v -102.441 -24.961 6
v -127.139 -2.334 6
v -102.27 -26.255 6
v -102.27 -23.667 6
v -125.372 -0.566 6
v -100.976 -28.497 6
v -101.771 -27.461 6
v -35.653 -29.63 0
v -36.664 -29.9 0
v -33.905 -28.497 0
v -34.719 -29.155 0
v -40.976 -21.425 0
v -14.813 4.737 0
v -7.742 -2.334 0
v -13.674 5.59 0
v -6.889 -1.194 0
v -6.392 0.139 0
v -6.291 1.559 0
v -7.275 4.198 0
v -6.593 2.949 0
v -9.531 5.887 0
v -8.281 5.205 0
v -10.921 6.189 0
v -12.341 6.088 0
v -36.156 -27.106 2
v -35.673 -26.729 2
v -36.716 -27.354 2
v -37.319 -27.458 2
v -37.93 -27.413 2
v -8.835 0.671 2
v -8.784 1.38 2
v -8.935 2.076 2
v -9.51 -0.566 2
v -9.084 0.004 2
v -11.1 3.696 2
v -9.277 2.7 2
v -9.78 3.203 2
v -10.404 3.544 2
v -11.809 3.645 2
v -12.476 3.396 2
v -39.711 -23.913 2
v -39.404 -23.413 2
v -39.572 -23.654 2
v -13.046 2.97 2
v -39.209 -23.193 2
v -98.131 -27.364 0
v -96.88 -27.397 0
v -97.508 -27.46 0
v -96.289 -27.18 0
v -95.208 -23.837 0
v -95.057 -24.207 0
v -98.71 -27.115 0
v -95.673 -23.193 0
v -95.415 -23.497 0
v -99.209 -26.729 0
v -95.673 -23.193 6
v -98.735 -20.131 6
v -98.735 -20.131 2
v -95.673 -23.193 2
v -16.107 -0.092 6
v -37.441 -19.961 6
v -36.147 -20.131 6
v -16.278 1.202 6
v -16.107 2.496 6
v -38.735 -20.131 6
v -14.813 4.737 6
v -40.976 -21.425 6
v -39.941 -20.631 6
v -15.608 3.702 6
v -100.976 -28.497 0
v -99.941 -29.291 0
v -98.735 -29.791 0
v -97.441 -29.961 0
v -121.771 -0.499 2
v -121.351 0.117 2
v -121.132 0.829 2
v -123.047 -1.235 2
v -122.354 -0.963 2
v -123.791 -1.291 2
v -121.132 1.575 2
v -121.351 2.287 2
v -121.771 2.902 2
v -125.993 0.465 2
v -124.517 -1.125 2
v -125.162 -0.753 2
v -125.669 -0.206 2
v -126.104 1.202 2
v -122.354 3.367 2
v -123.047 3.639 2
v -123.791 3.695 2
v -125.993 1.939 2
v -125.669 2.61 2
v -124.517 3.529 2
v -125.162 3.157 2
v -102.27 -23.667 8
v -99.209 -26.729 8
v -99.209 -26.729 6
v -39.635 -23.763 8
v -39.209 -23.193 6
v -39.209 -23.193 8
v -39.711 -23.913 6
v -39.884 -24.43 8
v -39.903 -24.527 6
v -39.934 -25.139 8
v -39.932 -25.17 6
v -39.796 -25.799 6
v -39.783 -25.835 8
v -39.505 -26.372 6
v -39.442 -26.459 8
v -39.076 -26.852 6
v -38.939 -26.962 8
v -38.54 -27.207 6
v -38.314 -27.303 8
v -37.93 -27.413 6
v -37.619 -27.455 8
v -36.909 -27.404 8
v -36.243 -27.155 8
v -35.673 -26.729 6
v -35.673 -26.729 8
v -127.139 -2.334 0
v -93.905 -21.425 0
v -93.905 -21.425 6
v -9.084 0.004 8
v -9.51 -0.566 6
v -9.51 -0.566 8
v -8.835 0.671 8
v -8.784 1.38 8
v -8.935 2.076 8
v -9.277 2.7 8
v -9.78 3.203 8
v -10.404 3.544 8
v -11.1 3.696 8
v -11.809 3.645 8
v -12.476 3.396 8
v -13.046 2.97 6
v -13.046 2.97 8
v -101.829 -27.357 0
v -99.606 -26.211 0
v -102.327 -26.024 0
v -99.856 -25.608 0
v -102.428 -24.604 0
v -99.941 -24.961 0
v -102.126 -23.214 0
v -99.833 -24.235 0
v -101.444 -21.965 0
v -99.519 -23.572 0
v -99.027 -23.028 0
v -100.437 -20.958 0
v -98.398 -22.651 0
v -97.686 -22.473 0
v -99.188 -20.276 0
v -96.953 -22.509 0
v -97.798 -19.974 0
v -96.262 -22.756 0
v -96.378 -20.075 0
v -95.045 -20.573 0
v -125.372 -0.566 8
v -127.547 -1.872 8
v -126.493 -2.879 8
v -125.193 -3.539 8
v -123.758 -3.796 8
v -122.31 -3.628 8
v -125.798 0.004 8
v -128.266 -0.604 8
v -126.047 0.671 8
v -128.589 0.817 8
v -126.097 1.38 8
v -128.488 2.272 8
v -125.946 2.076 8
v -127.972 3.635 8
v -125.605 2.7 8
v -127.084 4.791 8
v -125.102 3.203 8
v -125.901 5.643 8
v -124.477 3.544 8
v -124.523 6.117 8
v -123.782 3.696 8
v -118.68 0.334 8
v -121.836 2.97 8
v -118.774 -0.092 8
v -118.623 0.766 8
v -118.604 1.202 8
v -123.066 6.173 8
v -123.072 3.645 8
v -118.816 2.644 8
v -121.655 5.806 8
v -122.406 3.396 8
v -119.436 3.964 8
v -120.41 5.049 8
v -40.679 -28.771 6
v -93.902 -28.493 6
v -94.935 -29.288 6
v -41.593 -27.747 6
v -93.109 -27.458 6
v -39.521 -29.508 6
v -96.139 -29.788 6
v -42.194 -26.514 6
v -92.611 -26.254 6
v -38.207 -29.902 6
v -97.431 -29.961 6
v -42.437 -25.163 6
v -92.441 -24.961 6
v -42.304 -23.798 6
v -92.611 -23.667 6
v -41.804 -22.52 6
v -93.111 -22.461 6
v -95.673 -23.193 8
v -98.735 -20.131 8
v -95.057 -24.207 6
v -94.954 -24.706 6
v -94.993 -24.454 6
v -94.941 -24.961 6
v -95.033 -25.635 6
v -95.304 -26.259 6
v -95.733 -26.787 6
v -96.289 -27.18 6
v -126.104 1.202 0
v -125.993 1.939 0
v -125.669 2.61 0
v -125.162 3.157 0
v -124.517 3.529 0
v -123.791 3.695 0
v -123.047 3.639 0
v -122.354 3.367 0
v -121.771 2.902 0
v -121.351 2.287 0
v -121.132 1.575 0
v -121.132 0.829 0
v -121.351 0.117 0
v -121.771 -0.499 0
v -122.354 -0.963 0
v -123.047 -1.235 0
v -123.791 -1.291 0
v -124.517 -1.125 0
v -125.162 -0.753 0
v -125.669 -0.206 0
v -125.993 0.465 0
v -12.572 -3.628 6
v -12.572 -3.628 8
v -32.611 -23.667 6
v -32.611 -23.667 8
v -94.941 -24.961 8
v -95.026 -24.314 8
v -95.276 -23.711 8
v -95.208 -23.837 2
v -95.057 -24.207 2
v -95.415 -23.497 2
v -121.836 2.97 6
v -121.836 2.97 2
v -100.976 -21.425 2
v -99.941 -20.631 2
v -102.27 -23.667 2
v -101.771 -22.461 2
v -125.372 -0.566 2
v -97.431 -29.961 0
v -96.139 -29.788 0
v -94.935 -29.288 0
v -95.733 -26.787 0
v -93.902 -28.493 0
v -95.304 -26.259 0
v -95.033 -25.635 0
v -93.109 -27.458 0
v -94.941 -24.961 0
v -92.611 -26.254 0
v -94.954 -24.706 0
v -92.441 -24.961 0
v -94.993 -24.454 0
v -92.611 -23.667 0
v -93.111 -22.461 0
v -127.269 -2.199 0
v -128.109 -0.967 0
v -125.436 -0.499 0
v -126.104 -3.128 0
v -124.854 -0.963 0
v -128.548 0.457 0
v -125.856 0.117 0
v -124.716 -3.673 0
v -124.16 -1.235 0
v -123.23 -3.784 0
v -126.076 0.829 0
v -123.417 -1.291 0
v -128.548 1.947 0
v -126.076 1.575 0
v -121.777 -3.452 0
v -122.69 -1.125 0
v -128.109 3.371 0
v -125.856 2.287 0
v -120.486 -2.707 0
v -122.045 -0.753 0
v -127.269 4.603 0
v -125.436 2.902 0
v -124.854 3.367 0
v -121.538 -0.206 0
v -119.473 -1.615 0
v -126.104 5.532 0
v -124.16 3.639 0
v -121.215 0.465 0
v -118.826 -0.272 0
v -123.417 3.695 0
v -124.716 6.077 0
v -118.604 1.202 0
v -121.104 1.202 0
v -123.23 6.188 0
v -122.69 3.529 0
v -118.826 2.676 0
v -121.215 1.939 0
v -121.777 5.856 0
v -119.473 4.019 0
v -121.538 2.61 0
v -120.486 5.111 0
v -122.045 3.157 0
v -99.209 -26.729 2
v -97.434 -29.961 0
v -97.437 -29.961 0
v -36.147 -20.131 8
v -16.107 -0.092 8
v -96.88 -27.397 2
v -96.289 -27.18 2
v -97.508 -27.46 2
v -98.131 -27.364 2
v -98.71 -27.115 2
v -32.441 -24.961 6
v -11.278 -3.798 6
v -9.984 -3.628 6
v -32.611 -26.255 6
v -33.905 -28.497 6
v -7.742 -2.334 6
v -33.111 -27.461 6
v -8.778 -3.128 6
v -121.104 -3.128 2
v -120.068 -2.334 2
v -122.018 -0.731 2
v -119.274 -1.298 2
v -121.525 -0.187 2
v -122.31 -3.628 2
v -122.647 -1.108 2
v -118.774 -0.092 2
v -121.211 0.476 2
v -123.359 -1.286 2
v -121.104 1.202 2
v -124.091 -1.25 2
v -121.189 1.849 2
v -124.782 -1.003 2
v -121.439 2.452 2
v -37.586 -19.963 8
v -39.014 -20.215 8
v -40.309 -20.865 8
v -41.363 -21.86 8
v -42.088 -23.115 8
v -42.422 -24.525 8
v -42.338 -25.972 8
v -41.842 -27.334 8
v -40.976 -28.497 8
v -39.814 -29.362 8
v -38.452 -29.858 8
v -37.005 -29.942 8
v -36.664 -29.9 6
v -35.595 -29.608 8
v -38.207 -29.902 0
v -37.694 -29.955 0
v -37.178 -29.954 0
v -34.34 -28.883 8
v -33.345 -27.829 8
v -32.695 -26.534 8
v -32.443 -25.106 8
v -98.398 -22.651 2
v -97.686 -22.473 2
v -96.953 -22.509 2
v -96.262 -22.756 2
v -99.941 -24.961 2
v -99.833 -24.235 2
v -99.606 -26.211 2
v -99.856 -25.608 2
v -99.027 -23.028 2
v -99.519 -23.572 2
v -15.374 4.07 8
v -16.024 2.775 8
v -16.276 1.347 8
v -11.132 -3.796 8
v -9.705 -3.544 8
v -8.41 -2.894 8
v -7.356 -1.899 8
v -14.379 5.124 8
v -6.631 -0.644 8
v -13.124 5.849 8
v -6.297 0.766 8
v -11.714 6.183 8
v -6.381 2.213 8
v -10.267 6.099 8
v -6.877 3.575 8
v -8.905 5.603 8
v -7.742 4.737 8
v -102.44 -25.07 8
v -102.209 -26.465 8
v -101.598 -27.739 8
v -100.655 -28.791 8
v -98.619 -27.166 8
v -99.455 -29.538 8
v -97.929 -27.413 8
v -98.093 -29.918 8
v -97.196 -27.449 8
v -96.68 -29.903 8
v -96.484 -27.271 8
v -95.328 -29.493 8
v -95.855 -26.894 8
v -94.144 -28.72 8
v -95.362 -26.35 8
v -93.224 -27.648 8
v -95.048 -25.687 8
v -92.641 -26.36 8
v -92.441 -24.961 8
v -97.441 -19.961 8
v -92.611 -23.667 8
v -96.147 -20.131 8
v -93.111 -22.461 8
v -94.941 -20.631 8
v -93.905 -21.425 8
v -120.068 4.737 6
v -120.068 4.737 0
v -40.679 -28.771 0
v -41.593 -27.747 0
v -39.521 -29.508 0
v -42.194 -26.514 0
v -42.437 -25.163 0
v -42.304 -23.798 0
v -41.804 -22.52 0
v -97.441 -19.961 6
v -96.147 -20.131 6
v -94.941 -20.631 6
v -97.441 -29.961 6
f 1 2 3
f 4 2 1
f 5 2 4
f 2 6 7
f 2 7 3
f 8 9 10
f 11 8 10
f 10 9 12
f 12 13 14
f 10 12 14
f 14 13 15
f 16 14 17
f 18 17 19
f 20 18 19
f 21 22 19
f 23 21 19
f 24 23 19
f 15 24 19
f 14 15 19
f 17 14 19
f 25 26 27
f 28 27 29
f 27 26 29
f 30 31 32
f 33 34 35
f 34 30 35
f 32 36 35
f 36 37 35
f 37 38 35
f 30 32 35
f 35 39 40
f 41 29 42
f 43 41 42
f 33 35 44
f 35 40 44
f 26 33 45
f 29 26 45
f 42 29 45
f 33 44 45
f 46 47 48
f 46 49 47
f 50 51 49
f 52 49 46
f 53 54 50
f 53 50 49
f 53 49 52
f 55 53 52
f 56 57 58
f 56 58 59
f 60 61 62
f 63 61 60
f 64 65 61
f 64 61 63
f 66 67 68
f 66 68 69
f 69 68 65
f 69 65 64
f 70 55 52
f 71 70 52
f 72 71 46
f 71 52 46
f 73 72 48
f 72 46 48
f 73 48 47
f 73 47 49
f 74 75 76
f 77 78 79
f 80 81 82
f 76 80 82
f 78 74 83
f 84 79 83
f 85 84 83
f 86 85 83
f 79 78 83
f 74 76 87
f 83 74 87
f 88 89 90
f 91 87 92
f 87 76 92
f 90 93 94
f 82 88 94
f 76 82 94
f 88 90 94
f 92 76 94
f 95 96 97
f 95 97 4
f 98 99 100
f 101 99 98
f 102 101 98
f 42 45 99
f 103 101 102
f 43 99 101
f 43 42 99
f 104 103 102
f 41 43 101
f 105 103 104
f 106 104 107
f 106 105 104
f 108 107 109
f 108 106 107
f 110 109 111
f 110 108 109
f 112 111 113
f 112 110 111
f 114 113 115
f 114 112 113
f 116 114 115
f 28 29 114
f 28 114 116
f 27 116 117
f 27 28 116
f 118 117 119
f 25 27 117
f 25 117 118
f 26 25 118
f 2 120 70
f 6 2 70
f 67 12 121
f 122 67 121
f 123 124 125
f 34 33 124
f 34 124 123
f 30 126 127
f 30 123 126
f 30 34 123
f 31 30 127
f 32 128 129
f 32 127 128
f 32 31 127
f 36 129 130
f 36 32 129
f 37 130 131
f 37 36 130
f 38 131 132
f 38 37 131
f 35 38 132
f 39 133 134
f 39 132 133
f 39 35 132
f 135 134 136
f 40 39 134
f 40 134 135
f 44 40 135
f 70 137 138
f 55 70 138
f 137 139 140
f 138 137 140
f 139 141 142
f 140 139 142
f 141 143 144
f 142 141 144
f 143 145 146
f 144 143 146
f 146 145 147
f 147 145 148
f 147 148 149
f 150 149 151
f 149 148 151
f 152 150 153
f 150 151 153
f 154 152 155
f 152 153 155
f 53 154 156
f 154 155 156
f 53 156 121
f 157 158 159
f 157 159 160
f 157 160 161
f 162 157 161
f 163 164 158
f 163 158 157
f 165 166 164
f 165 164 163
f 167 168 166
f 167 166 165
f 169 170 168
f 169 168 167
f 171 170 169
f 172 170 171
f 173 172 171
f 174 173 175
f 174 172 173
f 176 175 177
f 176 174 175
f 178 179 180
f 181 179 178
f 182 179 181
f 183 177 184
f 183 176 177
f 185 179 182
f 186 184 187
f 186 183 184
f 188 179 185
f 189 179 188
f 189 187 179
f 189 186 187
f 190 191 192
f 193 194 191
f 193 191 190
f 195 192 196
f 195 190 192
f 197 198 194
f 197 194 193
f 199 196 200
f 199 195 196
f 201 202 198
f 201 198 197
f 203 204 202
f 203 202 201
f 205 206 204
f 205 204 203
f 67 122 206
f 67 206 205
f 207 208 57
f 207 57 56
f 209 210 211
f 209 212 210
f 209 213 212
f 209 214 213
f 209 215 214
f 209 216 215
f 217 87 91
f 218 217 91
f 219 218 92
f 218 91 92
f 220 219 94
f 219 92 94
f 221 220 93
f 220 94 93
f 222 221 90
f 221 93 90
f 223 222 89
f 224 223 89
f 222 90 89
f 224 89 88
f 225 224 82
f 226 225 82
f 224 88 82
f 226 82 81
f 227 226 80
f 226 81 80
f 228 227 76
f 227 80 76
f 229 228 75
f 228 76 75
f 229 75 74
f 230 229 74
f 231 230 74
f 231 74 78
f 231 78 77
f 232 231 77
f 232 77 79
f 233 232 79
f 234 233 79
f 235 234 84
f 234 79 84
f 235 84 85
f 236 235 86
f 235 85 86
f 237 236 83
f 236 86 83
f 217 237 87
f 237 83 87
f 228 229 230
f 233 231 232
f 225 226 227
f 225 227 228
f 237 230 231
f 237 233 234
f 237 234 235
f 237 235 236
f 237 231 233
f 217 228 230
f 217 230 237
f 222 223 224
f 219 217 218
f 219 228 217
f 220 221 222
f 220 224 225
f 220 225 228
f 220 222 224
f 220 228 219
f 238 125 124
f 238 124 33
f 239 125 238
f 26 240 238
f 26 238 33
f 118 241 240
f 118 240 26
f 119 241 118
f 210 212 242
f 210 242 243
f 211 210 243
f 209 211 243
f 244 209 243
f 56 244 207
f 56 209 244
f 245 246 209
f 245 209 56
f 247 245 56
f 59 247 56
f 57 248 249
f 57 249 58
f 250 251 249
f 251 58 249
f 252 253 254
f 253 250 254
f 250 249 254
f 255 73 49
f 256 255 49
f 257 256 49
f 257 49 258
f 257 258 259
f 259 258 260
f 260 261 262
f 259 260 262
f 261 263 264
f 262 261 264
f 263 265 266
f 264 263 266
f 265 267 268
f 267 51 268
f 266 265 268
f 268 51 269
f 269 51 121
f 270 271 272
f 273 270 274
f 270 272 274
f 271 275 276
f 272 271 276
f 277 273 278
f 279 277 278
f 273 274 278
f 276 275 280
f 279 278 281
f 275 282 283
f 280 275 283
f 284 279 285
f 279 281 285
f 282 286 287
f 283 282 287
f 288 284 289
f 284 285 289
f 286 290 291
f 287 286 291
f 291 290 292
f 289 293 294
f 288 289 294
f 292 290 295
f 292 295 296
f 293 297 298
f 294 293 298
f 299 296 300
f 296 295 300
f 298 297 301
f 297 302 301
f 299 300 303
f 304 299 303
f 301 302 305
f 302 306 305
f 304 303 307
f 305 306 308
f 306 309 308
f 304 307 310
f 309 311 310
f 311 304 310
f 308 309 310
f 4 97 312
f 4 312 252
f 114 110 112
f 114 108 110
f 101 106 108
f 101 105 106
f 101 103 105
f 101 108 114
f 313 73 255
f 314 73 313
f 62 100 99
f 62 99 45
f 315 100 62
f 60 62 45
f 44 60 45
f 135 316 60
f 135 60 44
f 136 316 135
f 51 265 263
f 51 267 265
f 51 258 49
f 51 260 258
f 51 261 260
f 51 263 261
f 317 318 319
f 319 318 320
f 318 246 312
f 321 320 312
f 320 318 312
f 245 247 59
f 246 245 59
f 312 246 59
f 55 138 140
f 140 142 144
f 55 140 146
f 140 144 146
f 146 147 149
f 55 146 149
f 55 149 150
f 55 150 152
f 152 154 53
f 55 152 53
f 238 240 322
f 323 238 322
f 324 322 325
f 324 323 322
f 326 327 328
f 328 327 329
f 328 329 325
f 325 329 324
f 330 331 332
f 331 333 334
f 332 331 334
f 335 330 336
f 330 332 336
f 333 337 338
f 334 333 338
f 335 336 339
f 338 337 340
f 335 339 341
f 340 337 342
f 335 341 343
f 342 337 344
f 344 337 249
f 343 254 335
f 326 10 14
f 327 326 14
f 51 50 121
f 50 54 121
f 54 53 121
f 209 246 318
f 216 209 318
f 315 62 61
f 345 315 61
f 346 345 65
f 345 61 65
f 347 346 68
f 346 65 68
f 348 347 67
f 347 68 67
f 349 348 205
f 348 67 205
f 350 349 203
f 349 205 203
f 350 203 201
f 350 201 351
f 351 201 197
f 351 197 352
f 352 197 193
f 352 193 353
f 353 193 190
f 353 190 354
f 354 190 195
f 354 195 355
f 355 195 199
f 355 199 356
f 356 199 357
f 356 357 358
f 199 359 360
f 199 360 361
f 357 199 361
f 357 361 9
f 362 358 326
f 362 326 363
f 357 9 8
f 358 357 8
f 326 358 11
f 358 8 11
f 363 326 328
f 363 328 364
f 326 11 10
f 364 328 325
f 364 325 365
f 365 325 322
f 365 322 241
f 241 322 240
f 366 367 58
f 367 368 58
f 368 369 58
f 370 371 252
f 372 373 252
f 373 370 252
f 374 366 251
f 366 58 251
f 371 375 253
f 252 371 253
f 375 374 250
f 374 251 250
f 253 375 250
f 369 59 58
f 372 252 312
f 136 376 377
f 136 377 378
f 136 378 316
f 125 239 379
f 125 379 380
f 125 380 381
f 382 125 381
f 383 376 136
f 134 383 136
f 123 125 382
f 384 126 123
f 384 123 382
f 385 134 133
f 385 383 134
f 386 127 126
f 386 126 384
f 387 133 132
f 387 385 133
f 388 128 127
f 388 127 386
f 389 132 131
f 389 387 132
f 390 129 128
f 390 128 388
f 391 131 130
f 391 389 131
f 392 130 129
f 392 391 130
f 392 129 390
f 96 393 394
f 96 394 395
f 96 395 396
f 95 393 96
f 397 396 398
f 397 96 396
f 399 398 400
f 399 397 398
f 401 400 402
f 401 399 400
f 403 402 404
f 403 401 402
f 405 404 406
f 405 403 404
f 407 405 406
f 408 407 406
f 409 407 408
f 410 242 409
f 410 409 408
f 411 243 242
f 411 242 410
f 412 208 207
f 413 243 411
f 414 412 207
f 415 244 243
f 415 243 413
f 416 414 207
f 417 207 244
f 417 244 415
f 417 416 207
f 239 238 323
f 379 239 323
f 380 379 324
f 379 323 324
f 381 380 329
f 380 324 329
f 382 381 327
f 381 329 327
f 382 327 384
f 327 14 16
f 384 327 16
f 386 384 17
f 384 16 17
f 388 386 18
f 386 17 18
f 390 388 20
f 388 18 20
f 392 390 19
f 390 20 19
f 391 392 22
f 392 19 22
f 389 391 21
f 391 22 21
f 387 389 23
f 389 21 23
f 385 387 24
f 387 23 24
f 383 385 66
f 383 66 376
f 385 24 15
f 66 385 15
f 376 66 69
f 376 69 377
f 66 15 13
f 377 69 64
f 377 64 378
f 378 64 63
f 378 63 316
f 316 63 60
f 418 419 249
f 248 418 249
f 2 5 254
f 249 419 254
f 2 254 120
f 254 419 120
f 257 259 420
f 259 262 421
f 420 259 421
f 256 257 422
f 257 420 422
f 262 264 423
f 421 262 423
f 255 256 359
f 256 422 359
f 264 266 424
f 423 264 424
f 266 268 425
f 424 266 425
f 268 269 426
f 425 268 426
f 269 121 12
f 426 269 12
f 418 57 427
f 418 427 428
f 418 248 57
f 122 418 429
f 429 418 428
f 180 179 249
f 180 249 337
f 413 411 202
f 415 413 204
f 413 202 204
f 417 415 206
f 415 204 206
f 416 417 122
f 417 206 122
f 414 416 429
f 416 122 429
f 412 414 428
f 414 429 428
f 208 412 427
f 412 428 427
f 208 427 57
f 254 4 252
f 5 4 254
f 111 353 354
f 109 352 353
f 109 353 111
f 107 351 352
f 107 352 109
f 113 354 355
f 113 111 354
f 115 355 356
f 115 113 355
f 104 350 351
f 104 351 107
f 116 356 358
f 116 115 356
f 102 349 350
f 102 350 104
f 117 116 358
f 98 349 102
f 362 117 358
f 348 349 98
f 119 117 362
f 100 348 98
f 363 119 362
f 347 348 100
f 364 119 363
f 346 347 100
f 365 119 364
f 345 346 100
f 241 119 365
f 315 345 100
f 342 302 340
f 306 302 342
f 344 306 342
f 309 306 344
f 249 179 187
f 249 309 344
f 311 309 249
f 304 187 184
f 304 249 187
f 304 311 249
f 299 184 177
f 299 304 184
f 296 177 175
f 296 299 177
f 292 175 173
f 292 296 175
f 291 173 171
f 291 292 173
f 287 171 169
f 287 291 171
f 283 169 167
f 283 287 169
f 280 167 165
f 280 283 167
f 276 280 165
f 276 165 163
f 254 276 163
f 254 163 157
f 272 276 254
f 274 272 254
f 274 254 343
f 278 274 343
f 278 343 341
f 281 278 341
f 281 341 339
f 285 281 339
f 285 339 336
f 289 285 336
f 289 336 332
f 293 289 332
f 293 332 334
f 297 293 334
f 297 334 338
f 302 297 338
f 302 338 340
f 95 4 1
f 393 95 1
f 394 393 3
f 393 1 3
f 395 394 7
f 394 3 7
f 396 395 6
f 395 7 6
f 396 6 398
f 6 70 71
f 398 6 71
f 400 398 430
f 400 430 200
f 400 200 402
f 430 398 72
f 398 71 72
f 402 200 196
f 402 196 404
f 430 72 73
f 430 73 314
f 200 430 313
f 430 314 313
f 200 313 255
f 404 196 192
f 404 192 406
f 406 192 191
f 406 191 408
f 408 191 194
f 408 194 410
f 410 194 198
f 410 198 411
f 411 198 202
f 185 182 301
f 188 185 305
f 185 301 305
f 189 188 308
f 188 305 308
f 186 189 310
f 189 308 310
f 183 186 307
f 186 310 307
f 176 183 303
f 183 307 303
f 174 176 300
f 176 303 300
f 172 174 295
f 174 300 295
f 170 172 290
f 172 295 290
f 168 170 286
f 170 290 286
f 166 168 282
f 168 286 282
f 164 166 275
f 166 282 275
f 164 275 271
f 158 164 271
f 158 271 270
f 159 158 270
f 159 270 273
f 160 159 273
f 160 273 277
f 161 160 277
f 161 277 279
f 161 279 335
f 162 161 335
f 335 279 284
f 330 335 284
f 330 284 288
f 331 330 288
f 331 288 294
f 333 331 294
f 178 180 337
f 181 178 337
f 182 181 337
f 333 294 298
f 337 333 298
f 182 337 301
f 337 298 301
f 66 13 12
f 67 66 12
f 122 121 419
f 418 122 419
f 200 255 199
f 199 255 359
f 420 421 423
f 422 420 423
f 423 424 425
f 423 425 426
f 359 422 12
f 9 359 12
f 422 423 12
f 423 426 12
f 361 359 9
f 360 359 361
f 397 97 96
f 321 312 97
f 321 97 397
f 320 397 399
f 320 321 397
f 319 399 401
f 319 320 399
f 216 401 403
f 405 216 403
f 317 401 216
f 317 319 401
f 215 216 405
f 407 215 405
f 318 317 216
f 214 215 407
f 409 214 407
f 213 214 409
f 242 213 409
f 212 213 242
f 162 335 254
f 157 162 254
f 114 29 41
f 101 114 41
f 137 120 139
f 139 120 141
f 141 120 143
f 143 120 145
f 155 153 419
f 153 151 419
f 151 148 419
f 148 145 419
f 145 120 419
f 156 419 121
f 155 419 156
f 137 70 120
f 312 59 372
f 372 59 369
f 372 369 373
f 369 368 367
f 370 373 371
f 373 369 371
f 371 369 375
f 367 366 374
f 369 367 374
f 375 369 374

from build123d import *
from build123d.topology import SkipClean

# Parameters (mm, degrees)
SKETCH_1_R            = 5
SKETCH_1_R_2          = 2.5
EXTRUDE_1_DEPTH       = 10
EXTRUDE_1_2_DEPTH     = 10
EXTRUDE_1_3_DEPTH     = 10
EXTRUDE_1_4_DEPTH     = 10
EXTRUDE_2_DEPTH       = 6
CUT_EXTRUDE_1_DEPTH   = 4
EXTRUDE_START         = -2
EXTRUDE_3_OUTLINE_R   = 2.5
EXTRUDE_3_DEPTH       = 2
EXTRUDE_3_2_DEPTH     = 2
EXTRUDE_3_3_OUTLINE_R = 2.5
EXTRUDE_3_3_DEPTH     = 2
CUT_EXTRUDE_2_DEPTH   = 4
CUT_EXTRUDE_6_DEPTH   = 8
EXTRUDE_4_DEPTH       = 6
CUT_EXTRUDE_START     = -2
CUT_EXTRUDE_8_DEPTH   = 2
CUT_EXTRUDE_8_2_DEPTH = 2


with BuildPart() as part:
    # Эскиз1 → Бобышка-Вытянуть1 (new body)
    with BuildSketch(Plane.XY):
        with Locations((-11.277859903, 1.201925786)):
            Circle(SKETCH_1_R)
        with Locations((-11.277859903, 1.201925786)):
            Circle(SKETCH_1_R_2, mode=Mode.SUBTRACT)
    extrude(amount=EXTRUDE_1_DEPTH)



with BuildPart() as body_2:
    # Эскиз1 → Extrude 1 2 (new body)
    with BuildSketch(Plane.XY):
        with Locations((-37.440810807, -24.961025118)):
            Circle(SKETCH_1_R)
        with Locations((-37.440810807, -24.961025118)):
            Circle(SKETCH_1_R_2, mode=Mode.SUBTRACT)
    extrude(amount=EXTRUDE_1_2_DEPTH)


with BuildPart() as body_3:
    # Эскиз1 → Extrude 1 3 (new body)
    with BuildSketch(Plane.XY):
        with Locations((-97.440810807, -24.961025118)):
            Circle(SKETCH_1_R)
        with Locations((-97.440810807, -24.961025118)):
            Circle(SKETCH_1_R_2, mode=Mode.SUBTRACT)
    extrude(amount=EXTRUDE_1_3_DEPTH)


with BuildPart() as body_4:
    # Эскиз1 → Extrude 1 4 (new body)
    with BuildSketch(Plane.XY):
        with Locations((-123.603761711, 1.201925786)):
            Circle(SKETCH_1_R)
        with Locations((-123.603761711, 1.201925786)):
            Circle(SKETCH_1_R_2, mode=Mode.SUBTRACT)
    extrude(amount=EXTRUDE_1_4_DEPTH)


with BuildPart() as part_1:
    add(part.part)

    add(body_2.part)  # Бобышка-Вытянуть2 merges body 2
    # Эскиз3 → Бобышка-Вытянуть2 (add)
    with BuildSketch(Plane(origin=(0, 0, 0), x_dir=(-1, 0, 0), z_dir=(0, 0, -1))):
        Polygon((11.277859903, 1.201925786), (14.813393809, 4.737459692), (40.976344713, -21.425491212), (33.905276901, -28.496559024), (7.742325997, -2.33360812), align=None)
        Polygon((97.440810807, -24.961025118), (93.905276901, -21.425491212), (120.068227805, 4.737459692), (127.139295617, -2.33360812), (100.976344713, -28.496559024), align=None)
    extrude(amount=-EXTRUDE_2_DEPTH)

    # Эскиз4 → Вырез-Вытянуть1 (cut)
    with BuildSketch(Plane.XY.offset(6)):
        Polygon((-13.045626856, 2.969692739), (-9.51009295, -0.565841167), (-35.673043854, -26.728792071), (-39.20857776, -23.193258165), align=None)
    extrude(amount=-CUT_EXTRUDE_1_DEPTH, mode=Mode.SUBTRACT)

    # Extrude 3 2 outline → Extrude 3 2 (add)
    with BuildSketch(Plane(origin=(0, 0, 0), x_dir=(-1, 0, 0), z_dir=(0, 0, -1)).offset(EXTRUDE_START)):
        with BuildLine():
            Line((9.51009295, -0.565841167), (13.045626856, 2.969692739))
            ThreePointArc((13.045626856, 2.969692739), (9.51009295, 2.969692739), (9.51009295, -0.565841167))
        make_face()
        with BuildLine():
            Line((39.20857776, -23.193258165), (35.673043854, -26.728792071))
            ThreePointArc((35.673043854, -26.728792071), (39.20857776, -26.728792071), (39.20857776, -23.193258165))
        make_face()
    extrude(amount=EXTRUDE_3_2_DEPTH)

    # Эскиз4<2> → Вырез-Вытянуть2 (cut)
    with BuildSketch(Plane.XY.offset(6)):
        Polygon((-13.045626856, 2.969692739), (-9.51009295, -0.565841167), (-35.673043854, -26.728792071), (-39.20857776, -23.193258165), align=None)
    extrude(amount=CUT_EXTRUDE_2_DEPTH, mode=Mode.SUBTRACT)


with BuildPart() as body_4_2:
    # Бобышка-Вытянуть3: read off the stored shape, not the designer's step
    # Бобышка-Вытянуть3 outline → Бобышка-Вытянуть3 (new body)
    with BuildSketch(Plane(origin=(0, 0, 0), x_dir=(-1, 0, 0), z_dir=(0, 0, -1)).offset(EXTRUDE_START)):
        with Locations((123.603761711, 1.201925786)):
            Circle(EXTRUDE_3_OUTLINE_R)
    extrude(amount=EXTRUDE_3_DEPTH)


with BuildPart() as body_5:
    # Extrude 3 3 outline → Extrude 3 3 (new body)
    with BuildSketch(Plane(origin=(0, 0, 0), x_dir=(-1, 0, 0), z_dir=(0, 0, -1)).offset(EXTRUDE_START)):
        with Locations((97.440810807, -24.961025118)):
            Circle(EXTRUDE_3_3_OUTLINE_R)
    extrude(amount=EXTRUDE_3_3_DEPTH)


with BuildPart() as cut_extrude_6_tool:
    # Эскиз9 → Вырез-Вытянуть6 (new body)
    with BuildSketch(Plane.XY.offset(10)):
        Polygon((-123.603761711, 1.201925786), (-121.835994758, 2.969692739), (-95.673043854, -23.193258165), (-99.20857776, -26.728792071), (-125.371528664, -0.565841167), align=None)
    extrude(amount=-CUT_EXTRUDE_6_DEPTH)


with BuildPart() as part_2:
    add(part_1.part)

    # Вырез-Вытянуть6: cut by cut_extrude_6_tool
    add(cut_extrude_6_tool.part, mode=Mode.SUBTRACT)



with BuildPart() as body_3_1:
    add(body_3.part)

    # Вырез-Вытянуть6: cut by cut_extrude_6_tool
    add(cut_extrude_6_tool.part, mode=Mode.SUBTRACT)


with BuildPart() as body_4_1:
    add(body_4.part)

    # Вырез-Вытянуть6: cut by cut_extrude_6_tool
    add(cut_extrude_6_tool.part, mode=Mode.SUBTRACT)

    # Вырез-Вытянуть8: read off the stored shape, not the designer's step
    # Вырез-Вытянуть8 outline → Вырез-Вытянуть8 (cut)
    with BuildSketch(Plane.XY.offset(10).offset(CUT_EXTRUDE_START)):
        with BuildLine():
            ThreePointArc((-118.774132579, -0.092169439), (-127.139295617, 4.737459691), (-122.309666485, -3.627703345))
            Line((-122.309666485, -3.627703345), (-125.371528664, -0.565841167))
            ThreePointArc((-125.371528664, -0.565841167), (-125.371528664, 2.969692739), (-121.835994758, 2.969692739))
            Line((-121.835994758, 2.969692739), (-118.774132579, -0.092169439))
        make_face()
    extrude(amount=CUT_EXTRUDE_8_DEPTH, mode=Mode.SUBTRACT)


with BuildPart() as part_3:
    with SkipClean():  # the faces are left unmerged after this step: merging them gives an invalid solid
        add(part_2.part)

        add(body_3_1.part)  # Бобышка-Вытянуть4 merges body 3

        add(body_5.part)  # Бобышка-Вытянуть4 merges body 5
        # Эскиз10 → Бобышка-Вытянуть4 (add)
        with BuildSketch(Plane(origin=(0, 0, 0), x_dir=(-1, 0, 0), z_dir=(0, 0, -1))):
            Polygon((40.976344713, -21.425491212), (93.905276901, -21.425491212), (97.440810807, -29.961025118), (36.664459762, -29.900385305), align=None)
        extrude(amount=-EXTRUDE_4_DEPTH)

    # Cut-Extrude 8 2 outline → Cut-Extrude 8 2 (cut)
    with SkipClean():  # the faces are left unmerged after this step: merging them gives an invalid solid
        with BuildSketch(Plane.XY.offset(10).offset(CUT_EXTRUDE_START)):
            with BuildLine():
                Line((-32.611181676, -23.666929892), (-35.673043854, -26.728792071))
                ThreePointArc((-35.673043854, -26.728792071), (-39.20857776, -26.728792071), (-39.20857776, -23.193258165))
                Line((-39.20857776, -23.193258165), (-36.146715581, -20.131395986))
                ThreePointArc((-36.146715581, -20.131395986), (-40.976344714, -28.496559023), (-32.611181676, -23.666929892))
            make_face()
            with BuildLine():
                Line((-9.51009295, -0.565841167), (-12.571955129, -3.627703345))
                ThreePointArc((-12.571955129, -3.627703345), (-7.742325998, 4.737459693), (-16.107489035, -0.092169439))
                Line((-16.107489035, -0.092169439), (-13.045626856, 2.969692739))
                ThreePointArc((-13.045626856, 2.969692739), (-9.51009295, 2.969692739), (-9.51009295, -0.565841167))
            make_face()
            with BuildLine():
                Line((-98.734906032, -20.131395986), (-95.673043854, -23.193258165))
                ThreePointArc((-95.673043854, -23.193258165), (-95.673043854, -26.728792071), (-99.20857776, -26.728792071))
                Line((-99.20857776, -26.728792071), (-102.270439938, -23.666929892))
                ThreePointArc((-102.270439938, -23.666929892), (-93.9052769, -28.496559023), (-98.734906032, -20.131395986))
            make_face()
        extrude(amount=CUT_EXTRUDE_8_2_DEPTH, mode=Mode.SUBTRACT)


solid = Compound([body_4_2.part, body_4_1.part, part_3.part])
